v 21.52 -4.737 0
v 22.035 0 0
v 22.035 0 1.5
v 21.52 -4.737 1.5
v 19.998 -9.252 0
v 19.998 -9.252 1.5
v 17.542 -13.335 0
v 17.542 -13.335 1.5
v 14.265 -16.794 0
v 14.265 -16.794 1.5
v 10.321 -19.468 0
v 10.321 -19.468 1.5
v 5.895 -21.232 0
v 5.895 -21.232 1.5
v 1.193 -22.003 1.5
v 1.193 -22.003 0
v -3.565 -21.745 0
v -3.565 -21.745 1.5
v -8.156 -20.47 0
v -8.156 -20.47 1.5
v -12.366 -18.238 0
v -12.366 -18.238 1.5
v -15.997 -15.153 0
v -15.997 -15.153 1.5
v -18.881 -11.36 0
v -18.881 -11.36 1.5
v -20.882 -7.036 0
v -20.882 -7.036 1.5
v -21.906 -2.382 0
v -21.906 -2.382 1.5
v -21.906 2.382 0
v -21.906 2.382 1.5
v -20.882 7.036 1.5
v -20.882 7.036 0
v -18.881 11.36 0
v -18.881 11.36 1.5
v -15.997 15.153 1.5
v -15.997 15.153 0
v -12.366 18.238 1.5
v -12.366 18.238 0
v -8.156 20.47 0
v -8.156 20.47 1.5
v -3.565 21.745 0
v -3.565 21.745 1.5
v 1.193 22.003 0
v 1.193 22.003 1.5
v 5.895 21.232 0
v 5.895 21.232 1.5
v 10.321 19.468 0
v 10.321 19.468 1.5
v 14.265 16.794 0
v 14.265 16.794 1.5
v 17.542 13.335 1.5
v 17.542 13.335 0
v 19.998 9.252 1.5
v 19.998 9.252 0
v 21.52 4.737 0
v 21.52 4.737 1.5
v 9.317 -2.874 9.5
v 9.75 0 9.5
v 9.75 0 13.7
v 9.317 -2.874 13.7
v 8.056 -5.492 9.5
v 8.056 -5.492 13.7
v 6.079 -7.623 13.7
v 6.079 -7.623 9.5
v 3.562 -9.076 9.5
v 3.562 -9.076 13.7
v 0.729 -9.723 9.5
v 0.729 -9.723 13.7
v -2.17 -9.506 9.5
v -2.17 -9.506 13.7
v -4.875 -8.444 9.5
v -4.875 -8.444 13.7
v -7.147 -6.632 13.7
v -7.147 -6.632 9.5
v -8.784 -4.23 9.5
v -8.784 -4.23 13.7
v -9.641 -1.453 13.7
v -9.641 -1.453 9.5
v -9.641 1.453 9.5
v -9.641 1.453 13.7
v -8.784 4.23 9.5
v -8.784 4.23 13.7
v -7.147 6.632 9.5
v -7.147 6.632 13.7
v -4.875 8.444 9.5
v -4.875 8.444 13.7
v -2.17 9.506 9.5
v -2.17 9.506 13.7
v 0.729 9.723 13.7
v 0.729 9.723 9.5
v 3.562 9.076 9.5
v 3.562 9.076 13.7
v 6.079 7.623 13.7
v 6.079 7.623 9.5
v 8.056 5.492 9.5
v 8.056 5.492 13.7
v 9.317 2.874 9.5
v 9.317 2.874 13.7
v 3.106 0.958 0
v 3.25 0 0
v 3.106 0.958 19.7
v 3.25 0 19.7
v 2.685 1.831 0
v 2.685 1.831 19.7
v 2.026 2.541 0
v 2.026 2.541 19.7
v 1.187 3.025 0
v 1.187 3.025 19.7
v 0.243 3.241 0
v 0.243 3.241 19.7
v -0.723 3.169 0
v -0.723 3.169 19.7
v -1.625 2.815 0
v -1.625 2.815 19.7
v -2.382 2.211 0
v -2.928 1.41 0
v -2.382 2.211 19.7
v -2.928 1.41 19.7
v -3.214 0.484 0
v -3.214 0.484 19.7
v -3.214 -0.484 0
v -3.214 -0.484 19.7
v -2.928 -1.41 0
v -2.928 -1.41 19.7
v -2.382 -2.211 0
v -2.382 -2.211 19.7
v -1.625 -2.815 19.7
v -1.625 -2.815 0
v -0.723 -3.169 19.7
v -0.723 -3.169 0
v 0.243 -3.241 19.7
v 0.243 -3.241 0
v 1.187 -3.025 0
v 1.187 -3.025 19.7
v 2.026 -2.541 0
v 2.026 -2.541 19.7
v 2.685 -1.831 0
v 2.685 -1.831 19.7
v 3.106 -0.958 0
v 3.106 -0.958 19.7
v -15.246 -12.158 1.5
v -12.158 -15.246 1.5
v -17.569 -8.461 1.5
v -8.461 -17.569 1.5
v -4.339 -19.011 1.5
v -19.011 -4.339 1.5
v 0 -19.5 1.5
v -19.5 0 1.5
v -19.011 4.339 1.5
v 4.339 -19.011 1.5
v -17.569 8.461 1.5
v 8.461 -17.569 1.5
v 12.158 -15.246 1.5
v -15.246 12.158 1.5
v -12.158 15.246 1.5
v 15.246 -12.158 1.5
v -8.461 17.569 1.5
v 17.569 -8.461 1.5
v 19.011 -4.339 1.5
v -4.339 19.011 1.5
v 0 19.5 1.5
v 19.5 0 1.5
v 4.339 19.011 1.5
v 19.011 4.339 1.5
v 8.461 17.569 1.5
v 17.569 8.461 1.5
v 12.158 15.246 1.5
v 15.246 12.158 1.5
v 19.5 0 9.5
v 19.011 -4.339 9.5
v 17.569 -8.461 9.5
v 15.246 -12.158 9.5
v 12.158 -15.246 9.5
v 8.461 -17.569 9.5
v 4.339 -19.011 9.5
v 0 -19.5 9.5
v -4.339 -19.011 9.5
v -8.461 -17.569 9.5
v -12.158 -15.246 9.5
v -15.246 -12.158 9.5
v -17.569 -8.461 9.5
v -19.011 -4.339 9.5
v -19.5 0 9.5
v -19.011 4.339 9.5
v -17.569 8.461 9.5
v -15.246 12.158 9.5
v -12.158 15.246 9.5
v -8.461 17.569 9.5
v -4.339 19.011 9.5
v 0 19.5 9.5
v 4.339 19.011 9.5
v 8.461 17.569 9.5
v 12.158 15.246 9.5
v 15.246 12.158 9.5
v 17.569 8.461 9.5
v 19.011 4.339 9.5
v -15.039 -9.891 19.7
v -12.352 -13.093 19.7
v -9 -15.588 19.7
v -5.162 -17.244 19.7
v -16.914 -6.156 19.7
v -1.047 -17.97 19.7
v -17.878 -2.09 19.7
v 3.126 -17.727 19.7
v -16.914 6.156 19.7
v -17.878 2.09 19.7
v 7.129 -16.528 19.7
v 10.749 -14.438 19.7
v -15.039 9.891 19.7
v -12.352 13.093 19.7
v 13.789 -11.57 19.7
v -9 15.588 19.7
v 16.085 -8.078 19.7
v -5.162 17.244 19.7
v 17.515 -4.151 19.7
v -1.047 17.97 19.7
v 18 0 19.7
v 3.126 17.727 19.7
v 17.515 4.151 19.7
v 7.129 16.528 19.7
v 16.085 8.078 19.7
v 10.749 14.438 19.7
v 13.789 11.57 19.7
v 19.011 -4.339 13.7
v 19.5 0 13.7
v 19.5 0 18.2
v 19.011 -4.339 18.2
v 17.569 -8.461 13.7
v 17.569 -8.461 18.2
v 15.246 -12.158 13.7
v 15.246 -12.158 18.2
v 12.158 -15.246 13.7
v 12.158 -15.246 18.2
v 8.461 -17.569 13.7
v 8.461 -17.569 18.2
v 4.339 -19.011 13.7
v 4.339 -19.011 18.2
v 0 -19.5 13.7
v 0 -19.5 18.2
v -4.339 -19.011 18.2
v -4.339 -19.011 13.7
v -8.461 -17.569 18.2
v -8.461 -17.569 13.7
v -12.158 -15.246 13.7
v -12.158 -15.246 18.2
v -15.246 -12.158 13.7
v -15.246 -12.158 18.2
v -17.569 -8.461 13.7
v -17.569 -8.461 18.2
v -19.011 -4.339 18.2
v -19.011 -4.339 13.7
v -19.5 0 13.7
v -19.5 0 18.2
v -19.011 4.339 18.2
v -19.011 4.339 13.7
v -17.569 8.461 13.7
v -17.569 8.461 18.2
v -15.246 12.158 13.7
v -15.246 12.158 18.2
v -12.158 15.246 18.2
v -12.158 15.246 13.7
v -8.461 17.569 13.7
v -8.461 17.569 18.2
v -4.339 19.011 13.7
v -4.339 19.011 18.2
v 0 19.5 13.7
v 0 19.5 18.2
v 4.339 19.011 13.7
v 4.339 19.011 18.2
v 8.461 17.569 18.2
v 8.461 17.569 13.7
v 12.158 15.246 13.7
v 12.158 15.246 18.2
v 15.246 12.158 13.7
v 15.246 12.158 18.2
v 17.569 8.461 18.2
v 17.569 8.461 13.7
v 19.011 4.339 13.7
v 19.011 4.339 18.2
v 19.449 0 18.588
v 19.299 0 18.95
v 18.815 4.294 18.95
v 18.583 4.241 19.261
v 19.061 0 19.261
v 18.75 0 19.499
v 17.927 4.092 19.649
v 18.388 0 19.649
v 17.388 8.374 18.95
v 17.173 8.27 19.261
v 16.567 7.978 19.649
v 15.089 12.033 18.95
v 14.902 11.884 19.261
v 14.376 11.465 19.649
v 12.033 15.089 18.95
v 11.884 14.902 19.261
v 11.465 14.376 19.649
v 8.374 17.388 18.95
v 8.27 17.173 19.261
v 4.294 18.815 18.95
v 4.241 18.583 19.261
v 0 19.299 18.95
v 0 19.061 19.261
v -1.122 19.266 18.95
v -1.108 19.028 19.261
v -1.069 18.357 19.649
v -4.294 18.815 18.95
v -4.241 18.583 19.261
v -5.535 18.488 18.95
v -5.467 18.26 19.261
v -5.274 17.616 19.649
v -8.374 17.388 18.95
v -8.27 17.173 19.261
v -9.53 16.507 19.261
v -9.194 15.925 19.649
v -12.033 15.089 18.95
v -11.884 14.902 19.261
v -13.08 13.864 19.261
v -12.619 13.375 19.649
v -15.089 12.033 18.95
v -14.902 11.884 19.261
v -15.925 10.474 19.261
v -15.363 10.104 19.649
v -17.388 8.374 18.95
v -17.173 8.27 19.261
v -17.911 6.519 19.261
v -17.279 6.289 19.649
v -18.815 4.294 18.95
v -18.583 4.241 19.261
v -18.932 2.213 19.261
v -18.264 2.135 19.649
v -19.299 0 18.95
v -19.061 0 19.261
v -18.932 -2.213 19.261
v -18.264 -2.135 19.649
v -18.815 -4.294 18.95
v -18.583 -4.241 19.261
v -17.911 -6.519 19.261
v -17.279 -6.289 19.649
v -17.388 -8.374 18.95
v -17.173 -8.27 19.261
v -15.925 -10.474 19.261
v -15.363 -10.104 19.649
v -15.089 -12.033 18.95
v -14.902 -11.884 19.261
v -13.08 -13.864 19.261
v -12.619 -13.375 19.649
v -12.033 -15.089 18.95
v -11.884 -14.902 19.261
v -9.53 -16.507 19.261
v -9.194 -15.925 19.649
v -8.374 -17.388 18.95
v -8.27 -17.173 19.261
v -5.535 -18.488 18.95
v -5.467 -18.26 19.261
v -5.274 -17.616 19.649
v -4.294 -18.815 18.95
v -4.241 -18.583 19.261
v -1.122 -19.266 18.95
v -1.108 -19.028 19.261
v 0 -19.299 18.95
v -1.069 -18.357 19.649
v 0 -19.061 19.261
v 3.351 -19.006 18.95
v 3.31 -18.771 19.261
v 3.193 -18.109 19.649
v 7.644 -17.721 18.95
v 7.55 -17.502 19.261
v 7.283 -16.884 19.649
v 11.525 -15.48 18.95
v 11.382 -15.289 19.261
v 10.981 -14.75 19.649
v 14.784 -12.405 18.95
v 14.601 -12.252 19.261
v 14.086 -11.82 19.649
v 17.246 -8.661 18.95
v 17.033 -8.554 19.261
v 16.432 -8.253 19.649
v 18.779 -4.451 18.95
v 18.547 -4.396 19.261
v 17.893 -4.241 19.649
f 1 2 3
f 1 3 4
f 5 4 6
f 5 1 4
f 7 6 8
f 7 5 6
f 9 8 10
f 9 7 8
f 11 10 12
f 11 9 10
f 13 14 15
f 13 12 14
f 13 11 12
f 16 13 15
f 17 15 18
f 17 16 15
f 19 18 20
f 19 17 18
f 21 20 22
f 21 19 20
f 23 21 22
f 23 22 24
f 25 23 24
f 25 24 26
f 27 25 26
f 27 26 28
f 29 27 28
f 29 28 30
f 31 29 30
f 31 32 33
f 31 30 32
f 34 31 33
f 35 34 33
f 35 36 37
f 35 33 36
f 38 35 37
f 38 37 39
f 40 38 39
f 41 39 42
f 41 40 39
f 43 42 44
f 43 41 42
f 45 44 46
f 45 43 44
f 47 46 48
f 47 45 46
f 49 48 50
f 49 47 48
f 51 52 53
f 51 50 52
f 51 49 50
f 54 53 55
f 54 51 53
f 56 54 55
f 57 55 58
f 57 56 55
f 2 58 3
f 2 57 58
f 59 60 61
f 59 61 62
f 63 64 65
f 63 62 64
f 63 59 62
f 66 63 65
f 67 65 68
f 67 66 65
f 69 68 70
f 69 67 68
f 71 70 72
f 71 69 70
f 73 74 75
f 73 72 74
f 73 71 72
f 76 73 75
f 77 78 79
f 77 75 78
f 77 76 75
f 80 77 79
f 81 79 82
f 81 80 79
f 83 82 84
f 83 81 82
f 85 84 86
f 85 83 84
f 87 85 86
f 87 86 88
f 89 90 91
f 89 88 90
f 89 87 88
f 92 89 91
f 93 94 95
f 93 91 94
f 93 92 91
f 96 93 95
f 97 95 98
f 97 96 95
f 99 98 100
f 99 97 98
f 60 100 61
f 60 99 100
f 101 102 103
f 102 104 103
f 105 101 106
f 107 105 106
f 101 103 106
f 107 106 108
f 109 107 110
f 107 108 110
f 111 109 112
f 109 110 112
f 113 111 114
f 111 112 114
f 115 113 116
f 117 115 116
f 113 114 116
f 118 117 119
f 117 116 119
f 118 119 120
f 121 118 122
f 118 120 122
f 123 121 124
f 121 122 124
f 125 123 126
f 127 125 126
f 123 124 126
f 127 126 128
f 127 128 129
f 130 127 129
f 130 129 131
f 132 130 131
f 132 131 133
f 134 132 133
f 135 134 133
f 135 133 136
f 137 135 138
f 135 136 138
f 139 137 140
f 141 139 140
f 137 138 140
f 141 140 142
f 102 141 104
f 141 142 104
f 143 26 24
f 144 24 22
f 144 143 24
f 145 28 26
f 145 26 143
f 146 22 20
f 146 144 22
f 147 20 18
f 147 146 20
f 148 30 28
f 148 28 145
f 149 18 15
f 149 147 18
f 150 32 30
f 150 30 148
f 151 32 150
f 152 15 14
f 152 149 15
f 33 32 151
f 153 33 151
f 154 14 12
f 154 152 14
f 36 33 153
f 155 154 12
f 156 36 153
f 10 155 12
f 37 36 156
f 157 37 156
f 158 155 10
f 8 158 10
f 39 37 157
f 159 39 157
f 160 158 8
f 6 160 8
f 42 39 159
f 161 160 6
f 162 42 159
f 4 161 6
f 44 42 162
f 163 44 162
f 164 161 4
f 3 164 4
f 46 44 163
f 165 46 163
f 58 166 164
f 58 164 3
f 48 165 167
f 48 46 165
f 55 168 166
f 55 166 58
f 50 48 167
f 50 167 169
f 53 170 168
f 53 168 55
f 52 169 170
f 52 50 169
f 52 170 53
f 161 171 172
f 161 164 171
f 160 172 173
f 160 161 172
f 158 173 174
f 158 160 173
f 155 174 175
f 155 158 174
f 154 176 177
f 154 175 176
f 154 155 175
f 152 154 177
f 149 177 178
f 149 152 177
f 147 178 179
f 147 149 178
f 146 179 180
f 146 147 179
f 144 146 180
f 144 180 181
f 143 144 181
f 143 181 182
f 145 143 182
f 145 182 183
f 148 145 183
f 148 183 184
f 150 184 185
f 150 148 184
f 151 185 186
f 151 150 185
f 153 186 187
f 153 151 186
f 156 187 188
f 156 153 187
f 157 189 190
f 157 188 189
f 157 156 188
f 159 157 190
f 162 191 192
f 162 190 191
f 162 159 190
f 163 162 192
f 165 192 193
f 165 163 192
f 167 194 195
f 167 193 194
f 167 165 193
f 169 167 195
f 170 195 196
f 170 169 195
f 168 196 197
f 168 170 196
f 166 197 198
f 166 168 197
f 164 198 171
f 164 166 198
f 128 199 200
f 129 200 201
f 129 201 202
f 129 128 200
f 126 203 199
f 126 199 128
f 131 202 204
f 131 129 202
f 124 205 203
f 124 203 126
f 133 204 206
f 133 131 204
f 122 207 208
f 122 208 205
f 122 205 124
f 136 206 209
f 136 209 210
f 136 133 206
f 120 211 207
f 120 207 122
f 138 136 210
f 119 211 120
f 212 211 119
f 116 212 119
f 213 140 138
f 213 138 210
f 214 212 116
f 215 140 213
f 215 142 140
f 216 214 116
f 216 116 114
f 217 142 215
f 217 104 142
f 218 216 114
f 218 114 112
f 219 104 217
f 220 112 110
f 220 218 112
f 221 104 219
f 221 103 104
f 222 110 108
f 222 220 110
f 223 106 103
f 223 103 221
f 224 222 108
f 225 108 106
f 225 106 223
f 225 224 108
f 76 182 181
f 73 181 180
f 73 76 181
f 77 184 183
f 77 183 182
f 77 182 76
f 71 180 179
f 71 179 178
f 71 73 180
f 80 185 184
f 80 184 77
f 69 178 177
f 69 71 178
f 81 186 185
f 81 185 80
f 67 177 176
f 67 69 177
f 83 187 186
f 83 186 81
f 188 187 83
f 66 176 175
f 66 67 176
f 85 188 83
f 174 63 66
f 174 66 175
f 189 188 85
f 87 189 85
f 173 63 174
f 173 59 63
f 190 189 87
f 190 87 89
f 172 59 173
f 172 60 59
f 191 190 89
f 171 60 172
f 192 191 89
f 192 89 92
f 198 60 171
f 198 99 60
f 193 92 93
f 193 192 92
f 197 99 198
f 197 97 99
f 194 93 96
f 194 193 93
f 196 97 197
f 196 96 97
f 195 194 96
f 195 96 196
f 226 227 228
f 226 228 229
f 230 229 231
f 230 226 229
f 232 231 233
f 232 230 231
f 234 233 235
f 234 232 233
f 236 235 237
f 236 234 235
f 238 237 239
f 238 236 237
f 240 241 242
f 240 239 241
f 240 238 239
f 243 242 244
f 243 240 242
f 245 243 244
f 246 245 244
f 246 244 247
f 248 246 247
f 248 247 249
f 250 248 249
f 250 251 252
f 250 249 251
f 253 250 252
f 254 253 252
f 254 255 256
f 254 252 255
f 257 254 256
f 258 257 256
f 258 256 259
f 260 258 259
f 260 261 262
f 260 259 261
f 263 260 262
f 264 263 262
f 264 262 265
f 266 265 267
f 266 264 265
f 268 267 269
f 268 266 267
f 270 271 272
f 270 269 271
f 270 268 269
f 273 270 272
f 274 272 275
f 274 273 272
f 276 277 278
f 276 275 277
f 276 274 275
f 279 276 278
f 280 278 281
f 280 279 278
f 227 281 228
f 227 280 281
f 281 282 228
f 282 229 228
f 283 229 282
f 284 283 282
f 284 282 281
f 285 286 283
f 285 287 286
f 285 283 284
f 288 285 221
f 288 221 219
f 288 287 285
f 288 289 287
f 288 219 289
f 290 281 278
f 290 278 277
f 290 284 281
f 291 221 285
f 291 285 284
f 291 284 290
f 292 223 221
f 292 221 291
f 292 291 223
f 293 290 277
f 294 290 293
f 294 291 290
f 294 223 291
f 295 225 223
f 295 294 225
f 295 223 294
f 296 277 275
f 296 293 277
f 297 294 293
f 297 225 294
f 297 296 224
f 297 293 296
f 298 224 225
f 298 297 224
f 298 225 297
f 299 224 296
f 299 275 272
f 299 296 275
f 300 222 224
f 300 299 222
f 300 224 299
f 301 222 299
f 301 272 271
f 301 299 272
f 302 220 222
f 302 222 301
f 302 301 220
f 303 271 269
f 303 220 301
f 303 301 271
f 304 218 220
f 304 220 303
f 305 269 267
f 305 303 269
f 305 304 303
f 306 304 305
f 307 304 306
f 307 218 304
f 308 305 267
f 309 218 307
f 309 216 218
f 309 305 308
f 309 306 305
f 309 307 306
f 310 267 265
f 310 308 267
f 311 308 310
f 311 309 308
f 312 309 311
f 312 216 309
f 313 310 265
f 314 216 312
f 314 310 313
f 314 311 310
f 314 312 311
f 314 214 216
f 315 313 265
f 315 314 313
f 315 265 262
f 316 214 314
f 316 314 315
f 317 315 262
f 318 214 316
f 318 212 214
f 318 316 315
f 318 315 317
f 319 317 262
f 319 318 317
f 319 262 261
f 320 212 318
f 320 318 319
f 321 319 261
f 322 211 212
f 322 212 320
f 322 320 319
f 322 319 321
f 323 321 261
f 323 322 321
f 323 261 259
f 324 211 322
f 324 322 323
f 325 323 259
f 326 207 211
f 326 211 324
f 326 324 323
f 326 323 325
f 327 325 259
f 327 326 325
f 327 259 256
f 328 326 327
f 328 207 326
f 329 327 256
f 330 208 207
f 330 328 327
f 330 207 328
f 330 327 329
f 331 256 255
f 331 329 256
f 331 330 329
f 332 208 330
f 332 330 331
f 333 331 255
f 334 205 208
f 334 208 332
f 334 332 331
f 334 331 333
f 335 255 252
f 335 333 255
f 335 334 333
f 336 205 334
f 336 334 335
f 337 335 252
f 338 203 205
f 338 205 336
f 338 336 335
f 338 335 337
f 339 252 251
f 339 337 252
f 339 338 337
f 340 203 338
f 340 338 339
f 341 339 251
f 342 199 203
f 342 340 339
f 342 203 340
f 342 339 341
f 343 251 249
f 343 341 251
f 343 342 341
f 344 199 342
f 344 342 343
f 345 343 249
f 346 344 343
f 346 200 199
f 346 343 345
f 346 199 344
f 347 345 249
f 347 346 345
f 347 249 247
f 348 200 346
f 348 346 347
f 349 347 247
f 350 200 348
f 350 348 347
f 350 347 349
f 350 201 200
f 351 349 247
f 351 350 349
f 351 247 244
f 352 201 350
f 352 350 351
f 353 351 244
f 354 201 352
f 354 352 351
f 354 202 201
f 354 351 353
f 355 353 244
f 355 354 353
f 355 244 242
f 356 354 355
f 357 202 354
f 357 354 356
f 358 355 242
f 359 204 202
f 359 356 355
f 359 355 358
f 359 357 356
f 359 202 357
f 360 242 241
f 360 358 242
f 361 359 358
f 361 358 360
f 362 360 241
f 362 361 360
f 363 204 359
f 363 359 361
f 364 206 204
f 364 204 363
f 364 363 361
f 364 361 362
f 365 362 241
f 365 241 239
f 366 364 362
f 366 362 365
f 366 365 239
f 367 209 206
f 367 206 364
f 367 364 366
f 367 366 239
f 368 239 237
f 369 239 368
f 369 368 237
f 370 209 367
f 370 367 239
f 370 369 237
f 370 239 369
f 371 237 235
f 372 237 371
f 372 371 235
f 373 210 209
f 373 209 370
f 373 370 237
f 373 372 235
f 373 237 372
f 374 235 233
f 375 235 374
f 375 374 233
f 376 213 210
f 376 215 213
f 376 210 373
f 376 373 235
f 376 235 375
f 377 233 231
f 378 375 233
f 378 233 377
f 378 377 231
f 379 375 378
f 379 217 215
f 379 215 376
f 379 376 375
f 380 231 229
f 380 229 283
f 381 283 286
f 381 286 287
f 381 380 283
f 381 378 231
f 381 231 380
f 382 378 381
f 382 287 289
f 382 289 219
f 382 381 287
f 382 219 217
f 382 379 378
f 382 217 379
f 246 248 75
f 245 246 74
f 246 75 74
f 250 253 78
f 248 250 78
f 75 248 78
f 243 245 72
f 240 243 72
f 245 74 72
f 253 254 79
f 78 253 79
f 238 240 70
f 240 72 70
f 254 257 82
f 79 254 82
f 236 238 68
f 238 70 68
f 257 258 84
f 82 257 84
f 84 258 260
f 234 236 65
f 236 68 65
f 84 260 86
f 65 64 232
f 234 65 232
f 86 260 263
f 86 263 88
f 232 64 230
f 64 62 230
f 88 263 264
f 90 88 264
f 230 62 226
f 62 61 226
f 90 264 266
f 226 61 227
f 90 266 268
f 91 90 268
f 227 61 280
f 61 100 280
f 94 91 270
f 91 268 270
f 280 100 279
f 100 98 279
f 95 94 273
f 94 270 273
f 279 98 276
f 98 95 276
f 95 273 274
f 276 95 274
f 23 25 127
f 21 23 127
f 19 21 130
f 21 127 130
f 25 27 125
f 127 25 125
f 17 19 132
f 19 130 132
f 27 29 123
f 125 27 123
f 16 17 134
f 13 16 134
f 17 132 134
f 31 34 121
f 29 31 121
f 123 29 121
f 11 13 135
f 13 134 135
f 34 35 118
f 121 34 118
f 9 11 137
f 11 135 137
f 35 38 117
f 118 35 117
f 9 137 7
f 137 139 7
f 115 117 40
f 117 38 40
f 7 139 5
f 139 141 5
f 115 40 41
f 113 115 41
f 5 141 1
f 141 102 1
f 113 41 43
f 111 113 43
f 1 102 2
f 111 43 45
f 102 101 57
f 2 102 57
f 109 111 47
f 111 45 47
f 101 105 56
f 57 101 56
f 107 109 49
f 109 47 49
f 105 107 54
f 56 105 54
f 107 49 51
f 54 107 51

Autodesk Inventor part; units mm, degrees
ref_plane "YZ Plane" through (0, 0, 0) normal (1, 0, 0) x (0, 1, 0)
ref_plane "XZ Plane" through (0, 0, 0) normal (0, 1, 0) x (-1, 0, 0)
ref_plane "XY Plane" through (0, 0, 0) normal (0, 0, 1) x (1, 0, 0)
sketch "Skizze1" plane through (0, 0, 0) normal (0, 0, 1) x (1, 0, 0)
  circle A0 centre (0, 0) radius 22.035
  dimension "d0" = 44.07
extrude "Extrusion1" add sketch "Skizze1" along normal blind 1.5
sketch "Skizze2" plane through (0, 0, 1.5) normal (0, 0, 1) x (1, 0, 0)
  circle A0 centre (0, 0) radius 19.5
  dimension "d3" = 39
extrude "Extrusion2" add sketch "Skizze2" along normal blind 8
sketch "Skizze3" plane through (0, 0, 9.5) normal (0, 0, 1) x (1, 0, 0)
  circle A0 centre (0, 0) radius 9.75
  dimension "d6" = 19.5
extrude "Extrusion3" add sketch "Skizze3" along normal blind 4.2
sketch "Skizze4" plane through (0, 0, 13.7) normal (0, 0, 1) x (1, 0, 0)
  circle A0 centre (0, 0) radius 19.5
  dimension "d12" = 39
extrude "Extrusion4" add sketch "Skizze4" along normal blind 6
fillet "Rundung1" radius 1.5 1 edges at (-19.5, 0, 19.7)
sketch "Skizze5" plane through (0, 0, 19.7) normal (0, 0, 1) x (1, 0, 0)
  circle A0 centre (0, 0) radius 3.25
  dimension "d13" = 6.5
extrude "Extrusion5" cut sketch "Skizze5" against normal blind 100
